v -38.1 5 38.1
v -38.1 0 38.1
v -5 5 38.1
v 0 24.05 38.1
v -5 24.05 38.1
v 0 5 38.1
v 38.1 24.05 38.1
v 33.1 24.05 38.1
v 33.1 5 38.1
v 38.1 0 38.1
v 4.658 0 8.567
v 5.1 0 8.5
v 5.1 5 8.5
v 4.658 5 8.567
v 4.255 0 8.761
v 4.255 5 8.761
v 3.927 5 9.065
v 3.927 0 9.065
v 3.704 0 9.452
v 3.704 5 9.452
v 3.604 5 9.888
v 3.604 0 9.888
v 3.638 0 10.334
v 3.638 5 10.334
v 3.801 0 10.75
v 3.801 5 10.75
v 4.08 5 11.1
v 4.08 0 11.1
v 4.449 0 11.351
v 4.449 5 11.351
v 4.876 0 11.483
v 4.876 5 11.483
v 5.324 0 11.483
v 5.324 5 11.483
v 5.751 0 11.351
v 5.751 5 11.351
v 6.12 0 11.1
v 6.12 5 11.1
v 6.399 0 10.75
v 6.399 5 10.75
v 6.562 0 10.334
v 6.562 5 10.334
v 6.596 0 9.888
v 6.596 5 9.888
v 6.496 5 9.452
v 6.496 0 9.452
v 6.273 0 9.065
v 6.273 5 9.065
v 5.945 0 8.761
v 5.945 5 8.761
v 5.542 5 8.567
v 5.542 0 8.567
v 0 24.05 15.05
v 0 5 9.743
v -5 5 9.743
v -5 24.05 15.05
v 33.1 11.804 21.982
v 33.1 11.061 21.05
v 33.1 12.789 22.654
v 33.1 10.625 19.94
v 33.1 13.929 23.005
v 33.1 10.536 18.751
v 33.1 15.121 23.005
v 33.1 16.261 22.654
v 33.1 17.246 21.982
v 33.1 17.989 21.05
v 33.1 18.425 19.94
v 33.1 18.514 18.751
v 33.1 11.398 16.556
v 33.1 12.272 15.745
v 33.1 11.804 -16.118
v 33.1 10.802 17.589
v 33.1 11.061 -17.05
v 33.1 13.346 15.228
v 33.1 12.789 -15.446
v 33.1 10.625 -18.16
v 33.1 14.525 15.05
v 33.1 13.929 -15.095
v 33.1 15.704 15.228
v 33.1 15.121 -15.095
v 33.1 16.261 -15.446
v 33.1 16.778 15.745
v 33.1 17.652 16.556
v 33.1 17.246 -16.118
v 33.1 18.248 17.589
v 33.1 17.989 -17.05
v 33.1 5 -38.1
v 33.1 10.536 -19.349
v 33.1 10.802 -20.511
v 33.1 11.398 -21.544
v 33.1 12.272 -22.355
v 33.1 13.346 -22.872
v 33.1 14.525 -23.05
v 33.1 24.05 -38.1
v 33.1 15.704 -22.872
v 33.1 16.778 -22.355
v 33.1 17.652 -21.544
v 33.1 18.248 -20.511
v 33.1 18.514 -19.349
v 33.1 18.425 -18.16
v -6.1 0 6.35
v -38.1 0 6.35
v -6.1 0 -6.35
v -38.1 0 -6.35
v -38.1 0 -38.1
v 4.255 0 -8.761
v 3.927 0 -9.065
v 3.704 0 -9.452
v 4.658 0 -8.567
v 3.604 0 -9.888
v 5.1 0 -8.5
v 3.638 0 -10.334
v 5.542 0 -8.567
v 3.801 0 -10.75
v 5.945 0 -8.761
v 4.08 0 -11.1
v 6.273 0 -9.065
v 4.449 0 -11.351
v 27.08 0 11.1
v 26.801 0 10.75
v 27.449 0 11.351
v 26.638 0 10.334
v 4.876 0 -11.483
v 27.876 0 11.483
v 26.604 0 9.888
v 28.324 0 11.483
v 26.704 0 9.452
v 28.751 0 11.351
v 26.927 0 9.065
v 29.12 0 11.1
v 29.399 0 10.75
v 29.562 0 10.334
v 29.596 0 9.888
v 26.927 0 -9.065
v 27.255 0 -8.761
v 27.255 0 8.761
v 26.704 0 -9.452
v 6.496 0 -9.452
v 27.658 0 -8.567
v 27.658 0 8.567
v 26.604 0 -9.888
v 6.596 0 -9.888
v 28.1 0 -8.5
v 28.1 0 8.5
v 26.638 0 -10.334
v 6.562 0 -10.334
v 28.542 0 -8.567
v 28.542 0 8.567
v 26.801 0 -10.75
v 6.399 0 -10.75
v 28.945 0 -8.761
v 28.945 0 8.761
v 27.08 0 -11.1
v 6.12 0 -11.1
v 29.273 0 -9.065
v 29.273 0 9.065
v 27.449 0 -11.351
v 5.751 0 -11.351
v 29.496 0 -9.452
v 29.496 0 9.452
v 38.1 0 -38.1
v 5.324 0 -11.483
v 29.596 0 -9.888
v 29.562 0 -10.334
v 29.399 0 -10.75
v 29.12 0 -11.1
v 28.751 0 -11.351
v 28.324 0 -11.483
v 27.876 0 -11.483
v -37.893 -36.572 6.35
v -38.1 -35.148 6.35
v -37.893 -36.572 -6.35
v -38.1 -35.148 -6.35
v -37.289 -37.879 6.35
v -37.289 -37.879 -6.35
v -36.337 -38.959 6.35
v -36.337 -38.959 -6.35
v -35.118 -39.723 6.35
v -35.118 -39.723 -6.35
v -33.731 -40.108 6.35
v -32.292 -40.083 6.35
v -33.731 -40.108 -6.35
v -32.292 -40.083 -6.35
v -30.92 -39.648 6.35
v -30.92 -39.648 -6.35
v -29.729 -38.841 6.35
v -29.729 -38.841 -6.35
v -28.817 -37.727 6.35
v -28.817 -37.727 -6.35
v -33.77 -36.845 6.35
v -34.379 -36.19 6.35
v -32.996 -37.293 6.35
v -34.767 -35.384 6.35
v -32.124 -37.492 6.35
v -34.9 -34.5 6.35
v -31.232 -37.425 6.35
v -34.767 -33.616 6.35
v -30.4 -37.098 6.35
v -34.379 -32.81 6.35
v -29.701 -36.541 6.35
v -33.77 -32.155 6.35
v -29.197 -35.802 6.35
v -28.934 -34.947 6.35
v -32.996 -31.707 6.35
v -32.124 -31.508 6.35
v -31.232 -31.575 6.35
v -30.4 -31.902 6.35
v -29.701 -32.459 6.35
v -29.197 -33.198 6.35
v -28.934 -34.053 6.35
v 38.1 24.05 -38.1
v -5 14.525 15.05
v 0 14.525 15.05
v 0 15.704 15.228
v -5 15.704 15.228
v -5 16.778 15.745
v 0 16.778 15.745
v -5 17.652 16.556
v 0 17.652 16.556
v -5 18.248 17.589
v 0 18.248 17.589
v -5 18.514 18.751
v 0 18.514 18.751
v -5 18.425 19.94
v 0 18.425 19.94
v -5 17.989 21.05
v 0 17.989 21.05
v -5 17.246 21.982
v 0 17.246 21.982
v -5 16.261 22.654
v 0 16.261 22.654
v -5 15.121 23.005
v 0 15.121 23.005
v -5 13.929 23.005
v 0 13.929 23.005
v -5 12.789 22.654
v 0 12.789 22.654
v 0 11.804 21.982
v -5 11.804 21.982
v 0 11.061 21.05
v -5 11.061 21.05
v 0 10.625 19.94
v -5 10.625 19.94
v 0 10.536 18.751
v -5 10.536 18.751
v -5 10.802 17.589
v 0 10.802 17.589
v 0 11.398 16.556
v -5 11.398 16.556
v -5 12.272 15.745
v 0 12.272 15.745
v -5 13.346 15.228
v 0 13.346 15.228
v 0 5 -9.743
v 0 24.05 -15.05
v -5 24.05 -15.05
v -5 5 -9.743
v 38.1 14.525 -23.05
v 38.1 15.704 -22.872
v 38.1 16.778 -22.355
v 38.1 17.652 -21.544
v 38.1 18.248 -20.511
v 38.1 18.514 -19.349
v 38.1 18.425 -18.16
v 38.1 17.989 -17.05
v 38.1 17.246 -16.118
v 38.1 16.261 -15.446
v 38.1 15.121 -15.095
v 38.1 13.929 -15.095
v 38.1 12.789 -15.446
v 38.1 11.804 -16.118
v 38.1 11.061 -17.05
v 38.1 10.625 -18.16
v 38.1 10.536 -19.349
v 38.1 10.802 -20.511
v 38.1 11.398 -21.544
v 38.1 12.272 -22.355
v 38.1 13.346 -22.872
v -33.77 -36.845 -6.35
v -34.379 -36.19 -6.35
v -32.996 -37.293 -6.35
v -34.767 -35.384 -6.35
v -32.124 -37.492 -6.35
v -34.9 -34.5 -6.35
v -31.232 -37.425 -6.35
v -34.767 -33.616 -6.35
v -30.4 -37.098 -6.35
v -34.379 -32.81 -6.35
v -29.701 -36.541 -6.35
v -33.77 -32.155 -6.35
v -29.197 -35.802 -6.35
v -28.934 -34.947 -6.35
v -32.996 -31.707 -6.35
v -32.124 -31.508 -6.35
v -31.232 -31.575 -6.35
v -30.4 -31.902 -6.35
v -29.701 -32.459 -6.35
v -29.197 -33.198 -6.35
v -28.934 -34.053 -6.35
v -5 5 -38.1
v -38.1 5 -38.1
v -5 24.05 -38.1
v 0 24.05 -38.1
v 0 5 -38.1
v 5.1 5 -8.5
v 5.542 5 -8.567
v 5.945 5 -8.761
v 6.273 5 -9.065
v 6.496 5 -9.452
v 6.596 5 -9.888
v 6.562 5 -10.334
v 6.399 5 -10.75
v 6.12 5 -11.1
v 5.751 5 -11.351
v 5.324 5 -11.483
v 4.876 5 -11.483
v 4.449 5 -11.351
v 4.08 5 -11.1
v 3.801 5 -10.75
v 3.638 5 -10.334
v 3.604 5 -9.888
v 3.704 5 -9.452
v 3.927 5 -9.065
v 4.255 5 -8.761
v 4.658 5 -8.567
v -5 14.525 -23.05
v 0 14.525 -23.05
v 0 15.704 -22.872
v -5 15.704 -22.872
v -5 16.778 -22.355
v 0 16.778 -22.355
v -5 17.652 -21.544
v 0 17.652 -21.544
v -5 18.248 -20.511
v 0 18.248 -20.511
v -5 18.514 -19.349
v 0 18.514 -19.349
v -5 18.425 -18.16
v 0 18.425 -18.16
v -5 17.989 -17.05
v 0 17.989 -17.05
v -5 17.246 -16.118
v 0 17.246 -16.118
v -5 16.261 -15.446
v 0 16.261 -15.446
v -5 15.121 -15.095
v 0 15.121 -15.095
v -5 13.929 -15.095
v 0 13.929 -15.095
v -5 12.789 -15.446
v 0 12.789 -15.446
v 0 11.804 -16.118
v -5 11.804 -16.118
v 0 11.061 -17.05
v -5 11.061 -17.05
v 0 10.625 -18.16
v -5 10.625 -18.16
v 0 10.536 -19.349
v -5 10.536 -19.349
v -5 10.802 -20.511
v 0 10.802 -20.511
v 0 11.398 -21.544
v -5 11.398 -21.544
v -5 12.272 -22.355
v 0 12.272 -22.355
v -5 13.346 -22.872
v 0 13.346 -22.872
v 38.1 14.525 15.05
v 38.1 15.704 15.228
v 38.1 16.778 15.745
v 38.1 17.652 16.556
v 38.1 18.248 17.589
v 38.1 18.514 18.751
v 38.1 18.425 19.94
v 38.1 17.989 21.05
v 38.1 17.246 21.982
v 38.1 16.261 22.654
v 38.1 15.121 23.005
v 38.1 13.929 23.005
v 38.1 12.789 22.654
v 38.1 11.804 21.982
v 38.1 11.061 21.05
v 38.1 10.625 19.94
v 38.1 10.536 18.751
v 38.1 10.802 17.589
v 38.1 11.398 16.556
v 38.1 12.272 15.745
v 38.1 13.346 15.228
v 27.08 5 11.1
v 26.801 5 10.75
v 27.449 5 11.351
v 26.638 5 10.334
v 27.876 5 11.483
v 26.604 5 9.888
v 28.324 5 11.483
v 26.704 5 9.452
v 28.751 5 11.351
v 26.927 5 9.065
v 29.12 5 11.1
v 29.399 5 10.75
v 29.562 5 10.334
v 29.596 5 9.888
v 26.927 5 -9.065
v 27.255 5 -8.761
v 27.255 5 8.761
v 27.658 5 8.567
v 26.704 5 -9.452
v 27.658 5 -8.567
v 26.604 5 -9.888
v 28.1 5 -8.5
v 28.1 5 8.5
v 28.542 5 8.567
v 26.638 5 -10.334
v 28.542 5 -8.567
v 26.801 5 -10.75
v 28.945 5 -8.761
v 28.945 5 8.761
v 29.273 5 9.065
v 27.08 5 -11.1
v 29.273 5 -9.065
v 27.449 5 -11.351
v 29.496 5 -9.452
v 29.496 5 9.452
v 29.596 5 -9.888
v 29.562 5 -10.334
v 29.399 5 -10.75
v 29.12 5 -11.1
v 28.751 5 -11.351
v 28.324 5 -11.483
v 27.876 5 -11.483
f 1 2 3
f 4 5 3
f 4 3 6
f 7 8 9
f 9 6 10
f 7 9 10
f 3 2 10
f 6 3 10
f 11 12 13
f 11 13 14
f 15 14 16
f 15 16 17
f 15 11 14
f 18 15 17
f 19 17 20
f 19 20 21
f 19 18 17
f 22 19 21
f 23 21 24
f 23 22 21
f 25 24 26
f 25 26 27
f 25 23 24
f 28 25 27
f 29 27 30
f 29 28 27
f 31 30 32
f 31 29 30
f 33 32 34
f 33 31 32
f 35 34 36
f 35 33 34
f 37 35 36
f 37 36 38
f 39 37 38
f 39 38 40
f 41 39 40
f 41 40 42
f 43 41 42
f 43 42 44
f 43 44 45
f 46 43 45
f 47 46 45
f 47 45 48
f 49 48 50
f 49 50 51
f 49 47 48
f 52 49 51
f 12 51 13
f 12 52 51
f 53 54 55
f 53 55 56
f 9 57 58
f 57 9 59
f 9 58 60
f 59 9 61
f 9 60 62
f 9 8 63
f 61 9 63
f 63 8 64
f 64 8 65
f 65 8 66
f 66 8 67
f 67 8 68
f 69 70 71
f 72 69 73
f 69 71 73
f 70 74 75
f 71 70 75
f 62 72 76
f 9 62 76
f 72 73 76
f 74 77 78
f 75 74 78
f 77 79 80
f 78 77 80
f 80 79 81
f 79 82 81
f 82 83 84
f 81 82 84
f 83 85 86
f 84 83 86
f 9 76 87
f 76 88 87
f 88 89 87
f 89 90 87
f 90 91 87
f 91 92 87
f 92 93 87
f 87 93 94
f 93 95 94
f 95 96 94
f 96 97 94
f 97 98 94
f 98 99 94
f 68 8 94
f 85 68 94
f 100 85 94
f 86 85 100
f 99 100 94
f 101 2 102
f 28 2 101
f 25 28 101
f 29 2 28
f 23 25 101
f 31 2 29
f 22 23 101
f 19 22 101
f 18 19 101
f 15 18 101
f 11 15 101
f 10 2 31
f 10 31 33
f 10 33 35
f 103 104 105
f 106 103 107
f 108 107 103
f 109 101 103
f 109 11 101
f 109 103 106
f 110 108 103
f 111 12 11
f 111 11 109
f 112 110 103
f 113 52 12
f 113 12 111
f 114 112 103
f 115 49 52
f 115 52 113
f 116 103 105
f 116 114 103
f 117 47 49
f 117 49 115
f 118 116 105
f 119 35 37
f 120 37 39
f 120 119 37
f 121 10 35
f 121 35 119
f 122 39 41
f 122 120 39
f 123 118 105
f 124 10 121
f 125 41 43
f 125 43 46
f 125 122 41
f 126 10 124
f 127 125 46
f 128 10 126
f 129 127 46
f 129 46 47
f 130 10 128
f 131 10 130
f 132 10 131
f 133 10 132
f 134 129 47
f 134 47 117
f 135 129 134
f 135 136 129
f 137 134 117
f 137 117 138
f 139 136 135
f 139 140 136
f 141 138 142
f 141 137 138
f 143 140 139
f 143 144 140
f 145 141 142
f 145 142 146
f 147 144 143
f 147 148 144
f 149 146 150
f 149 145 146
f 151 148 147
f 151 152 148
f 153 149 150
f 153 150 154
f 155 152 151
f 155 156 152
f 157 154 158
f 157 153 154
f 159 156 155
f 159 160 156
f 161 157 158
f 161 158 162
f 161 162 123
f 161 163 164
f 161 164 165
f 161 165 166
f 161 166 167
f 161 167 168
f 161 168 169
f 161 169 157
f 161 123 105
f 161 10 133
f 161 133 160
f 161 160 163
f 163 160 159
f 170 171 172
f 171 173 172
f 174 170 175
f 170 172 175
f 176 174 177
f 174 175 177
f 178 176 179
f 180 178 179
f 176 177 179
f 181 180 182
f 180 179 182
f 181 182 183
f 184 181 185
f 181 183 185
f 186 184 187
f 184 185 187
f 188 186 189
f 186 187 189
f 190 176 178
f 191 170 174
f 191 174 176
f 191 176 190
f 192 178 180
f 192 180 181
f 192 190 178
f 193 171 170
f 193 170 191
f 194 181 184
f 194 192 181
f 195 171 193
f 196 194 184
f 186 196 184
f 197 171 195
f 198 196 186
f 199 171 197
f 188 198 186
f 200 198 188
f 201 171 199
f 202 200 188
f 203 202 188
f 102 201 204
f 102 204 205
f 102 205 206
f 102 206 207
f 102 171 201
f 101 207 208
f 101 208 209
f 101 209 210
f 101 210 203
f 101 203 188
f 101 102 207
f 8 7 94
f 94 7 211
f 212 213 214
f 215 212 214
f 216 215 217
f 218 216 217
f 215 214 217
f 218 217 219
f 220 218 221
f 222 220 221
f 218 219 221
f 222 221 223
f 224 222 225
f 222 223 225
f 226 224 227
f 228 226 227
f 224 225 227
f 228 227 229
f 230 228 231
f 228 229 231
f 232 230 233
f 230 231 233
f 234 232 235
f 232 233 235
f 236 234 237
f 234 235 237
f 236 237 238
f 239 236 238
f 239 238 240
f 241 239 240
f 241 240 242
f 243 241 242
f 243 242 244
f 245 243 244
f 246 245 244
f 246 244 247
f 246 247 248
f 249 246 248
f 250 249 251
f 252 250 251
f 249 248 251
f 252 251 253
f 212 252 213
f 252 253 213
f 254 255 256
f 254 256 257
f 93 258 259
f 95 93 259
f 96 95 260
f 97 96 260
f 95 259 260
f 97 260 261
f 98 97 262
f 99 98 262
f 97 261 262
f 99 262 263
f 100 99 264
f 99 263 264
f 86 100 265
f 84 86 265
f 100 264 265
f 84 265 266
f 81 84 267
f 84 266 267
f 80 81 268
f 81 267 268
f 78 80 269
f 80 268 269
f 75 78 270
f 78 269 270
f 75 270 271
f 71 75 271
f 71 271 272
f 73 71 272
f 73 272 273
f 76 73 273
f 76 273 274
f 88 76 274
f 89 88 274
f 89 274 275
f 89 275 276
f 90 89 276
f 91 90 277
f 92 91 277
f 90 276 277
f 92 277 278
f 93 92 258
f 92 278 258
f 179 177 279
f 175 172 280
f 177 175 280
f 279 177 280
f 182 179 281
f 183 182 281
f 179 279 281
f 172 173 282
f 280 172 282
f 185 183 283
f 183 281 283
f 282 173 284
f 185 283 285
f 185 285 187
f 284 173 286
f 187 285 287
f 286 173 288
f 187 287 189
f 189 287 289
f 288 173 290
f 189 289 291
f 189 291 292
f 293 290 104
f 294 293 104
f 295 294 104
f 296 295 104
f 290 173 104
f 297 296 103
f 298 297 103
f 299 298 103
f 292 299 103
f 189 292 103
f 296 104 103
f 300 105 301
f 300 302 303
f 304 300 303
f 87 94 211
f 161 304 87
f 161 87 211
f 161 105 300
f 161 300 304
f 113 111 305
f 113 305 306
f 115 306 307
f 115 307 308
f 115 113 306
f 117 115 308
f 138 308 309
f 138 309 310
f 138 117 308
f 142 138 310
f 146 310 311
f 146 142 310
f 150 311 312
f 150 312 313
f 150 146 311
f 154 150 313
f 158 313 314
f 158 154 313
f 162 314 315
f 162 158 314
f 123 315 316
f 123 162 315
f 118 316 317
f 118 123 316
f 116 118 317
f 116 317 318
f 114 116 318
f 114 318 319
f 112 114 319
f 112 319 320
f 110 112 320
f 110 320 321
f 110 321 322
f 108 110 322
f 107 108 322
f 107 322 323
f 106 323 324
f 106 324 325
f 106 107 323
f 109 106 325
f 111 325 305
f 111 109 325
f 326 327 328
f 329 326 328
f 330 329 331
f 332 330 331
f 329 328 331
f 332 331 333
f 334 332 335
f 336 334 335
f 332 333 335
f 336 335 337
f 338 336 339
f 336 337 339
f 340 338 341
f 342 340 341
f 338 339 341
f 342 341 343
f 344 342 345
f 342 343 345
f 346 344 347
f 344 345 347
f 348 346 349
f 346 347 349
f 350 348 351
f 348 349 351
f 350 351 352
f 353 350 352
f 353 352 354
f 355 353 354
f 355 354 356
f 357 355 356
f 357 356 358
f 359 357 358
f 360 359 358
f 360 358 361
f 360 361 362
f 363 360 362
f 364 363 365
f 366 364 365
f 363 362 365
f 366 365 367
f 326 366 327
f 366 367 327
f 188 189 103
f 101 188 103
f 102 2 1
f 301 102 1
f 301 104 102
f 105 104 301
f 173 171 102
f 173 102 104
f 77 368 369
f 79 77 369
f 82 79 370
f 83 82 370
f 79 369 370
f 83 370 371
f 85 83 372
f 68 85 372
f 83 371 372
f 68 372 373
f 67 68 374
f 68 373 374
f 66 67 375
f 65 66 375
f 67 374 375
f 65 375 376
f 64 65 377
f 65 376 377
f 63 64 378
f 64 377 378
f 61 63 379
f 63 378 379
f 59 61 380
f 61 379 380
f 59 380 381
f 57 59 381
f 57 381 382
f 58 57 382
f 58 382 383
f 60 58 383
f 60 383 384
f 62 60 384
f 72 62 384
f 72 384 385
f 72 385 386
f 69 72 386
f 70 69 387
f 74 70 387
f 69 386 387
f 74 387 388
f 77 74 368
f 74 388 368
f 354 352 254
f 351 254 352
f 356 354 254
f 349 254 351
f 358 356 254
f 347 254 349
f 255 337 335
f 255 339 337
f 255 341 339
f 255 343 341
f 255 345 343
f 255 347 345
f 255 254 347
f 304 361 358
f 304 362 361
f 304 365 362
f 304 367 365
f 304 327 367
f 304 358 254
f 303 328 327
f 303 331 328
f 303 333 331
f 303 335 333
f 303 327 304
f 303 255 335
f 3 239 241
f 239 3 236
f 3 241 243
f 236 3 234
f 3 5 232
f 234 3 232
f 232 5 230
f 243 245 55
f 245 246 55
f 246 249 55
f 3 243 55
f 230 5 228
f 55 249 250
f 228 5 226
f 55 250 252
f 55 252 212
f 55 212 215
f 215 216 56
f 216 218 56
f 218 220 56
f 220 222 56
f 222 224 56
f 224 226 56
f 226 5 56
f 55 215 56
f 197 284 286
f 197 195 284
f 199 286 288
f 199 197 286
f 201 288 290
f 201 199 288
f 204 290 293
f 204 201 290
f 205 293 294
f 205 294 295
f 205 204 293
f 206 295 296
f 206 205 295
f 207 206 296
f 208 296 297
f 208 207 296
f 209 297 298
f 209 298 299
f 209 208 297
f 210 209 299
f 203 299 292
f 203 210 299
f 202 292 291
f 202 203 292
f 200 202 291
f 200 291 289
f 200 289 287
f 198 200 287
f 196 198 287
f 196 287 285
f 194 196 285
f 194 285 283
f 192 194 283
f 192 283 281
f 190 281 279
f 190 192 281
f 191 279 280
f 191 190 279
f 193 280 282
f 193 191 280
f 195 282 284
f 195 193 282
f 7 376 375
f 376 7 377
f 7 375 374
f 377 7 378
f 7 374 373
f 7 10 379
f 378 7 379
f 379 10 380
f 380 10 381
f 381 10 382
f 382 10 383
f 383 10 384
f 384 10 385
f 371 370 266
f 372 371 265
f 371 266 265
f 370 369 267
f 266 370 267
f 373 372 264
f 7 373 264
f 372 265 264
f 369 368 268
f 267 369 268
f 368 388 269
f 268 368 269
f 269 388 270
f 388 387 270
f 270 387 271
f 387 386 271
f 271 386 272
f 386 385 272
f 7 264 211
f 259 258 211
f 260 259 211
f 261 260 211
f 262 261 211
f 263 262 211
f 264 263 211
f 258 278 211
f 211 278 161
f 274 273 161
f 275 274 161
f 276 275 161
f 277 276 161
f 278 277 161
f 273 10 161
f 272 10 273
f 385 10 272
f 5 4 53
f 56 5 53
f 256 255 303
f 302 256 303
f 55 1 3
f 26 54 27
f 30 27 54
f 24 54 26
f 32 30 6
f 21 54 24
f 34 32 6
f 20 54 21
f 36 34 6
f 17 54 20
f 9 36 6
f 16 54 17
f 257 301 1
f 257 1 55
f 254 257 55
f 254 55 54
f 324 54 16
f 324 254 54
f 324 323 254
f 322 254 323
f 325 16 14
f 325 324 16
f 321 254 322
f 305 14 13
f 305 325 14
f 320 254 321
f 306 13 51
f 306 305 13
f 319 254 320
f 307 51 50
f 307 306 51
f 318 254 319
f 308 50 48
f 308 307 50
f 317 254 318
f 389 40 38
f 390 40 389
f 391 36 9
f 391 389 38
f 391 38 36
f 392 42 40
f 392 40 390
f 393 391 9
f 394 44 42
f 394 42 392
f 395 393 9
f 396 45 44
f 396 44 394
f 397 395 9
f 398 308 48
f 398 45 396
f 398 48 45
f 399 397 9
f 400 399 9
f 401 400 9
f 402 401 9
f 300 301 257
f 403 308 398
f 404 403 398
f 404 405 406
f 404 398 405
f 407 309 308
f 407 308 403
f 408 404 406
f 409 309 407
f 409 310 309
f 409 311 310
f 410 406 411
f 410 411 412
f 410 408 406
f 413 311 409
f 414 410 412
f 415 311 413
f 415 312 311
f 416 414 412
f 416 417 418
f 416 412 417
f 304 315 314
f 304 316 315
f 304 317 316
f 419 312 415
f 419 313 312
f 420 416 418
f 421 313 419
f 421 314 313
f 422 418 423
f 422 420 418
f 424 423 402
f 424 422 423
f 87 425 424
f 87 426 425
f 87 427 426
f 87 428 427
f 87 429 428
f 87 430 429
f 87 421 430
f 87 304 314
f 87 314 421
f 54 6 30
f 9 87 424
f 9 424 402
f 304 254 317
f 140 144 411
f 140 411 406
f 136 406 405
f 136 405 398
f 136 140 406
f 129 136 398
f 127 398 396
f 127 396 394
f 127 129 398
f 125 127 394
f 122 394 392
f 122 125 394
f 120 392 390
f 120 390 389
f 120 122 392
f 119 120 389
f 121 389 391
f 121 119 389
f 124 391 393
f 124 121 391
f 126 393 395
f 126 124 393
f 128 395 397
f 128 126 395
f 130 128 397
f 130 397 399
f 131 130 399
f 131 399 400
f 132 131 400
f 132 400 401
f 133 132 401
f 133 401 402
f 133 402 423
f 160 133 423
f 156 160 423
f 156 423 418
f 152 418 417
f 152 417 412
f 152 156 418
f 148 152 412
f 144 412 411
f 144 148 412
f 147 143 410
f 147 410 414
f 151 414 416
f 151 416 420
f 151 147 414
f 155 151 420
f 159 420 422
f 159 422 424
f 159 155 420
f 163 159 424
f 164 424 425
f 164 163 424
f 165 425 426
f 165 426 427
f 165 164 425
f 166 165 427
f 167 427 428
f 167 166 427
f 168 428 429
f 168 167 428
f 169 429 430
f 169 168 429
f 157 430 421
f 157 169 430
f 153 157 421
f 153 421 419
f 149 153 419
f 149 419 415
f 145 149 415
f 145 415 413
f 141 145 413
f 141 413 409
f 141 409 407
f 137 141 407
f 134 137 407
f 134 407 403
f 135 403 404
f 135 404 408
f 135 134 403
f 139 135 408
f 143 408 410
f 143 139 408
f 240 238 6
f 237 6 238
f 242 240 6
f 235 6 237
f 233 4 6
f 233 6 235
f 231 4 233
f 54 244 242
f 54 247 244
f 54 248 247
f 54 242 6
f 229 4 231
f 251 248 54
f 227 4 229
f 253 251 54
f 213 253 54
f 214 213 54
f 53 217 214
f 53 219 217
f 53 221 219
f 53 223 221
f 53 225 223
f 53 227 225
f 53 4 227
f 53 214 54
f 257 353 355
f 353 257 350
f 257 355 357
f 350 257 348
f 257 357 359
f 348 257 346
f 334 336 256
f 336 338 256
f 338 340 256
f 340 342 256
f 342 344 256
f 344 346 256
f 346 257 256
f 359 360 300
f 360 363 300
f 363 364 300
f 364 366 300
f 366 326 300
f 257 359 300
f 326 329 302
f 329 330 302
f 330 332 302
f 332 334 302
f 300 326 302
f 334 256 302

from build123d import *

# Parameters (mm, degrees)
SKETCH2_W           = 76.2
SKETCH2_H           = 76.2
SKETCH2_R           = 1.5
BOSS_EXTRUDE1_DEPTH = 5
SKETCH3_W           = 76.2
SKETCH3_H           = 24.05
SKETCH3_R           = 4
BOSS_EXTRUDE2_DEPTH = 5
LPATTERN1_COUNT     = 2
LPATTERN1_PITCH     = 38.1
BOSS_EXTRUDE5_START = -38.1
SKETCH4_R           = 3
BOSS_EXTRUDE5_DEPTH = 6.35
CUT_EXTRUDE1_DEPTH  = 10


with BuildPart() as part:
    # Sketch2 → Boss-Extrude1 (new body)
    with BuildSketch(Plane(origin=(0, 0, 0), x_dir=(1, 0, 0), z_dir=(0, 1, 0))):
        Rectangle(SKETCH2_W, SKETCH2_H)
        with Locations(Location((28.1, 10, 0), (0, 0, 270))):
            Circle(SKETCH2_R, mode=Mode.SUBTRACT)
        with Locations(Location((5.1, 10, 0), (0, 0, 270))):
            Circle(SKETCH2_R, mode=Mode.SUBTRACT)
        with Locations(Location((28.1, -10, 0), (0, 0, 90))):
            Circle(SKETCH2_R, mode=Mode.SUBTRACT)
        with Locations(Location((5.1, -10, 0), (0, 0, 90))):
            Circle(SKETCH2_R, mode=Mode.SUBTRACT)
    extrude(amount=BOSS_EXTRUDE1_DEPTH)

    # Sketch3 → Boss-Extrude2 (add)
    with BuildSketch(Plane(origin=(38.1, 0, 0), x_dir=(0, 0, -1), z_dir=(1, 0, 0))):
        with Locations((0, 12.025)):
            Rectangle(SKETCH3_W, SKETCH3_H)
        with Locations((-19.05, 14.525)):
            Circle(SKETCH3_R, mode=Mode.SUBTRACT)
        with Locations((19.05, 14.525)):
            Circle(SKETCH3_R, mode=Mode.SUBTRACT)
    boss_extrude2 = extrude(amount=-BOSS_EXTRUDE2_DEPTH)

    # LPattern1: Boss-Extrude2 ×2
    with Locations(*[(-i * LPATTERN1_PITCH, 0, 0) for i in range(1, LPATTERN1_COUNT)]):
        add(boss_extrude2)

    # Sketch4 → Boss-Extrude5 (add, symmetric)
    with BuildSketch(Plane(origin=(0, 0, -38.1), x_dir=(-1, 0, 0), z_dir=(0, 0, -1)).offset(BOSS_EXTRUDE5_START)):
        with BuildLine():
            Line((6.1, 0), (38.1, 0))
            Line((38.1, 0), (38.1, -35.148267781))
            ThreePointArc((38.1, -35.148267781), (34.438424912, -39.965800215), (28.816552498, -37.72742995))
            Line((28.816552498, -37.72742995), (6.1, 0))
        make_face()
        with Locations((31.9, -34.5)):
            Circle(SKETCH4_R, mode=Mode.SUBTRACT)
    extrude(amount=BOSS_EXTRUDE5_DEPTH, both=True)

    # Sketch5 → Cut-Extrude1 (cut)
    with BuildSketch(Plane(origin=(0, 0, 0), x_dir=(0, 0, -1), z_dir=(1, 0, 0))):
        Polygon((9.743329583, 5), (-9.743329583, 5), (-15.05, 24.05), (-9.743329583, 24.05), (9.743329583, 24.05), (15.05, 24.05), align=None)
    extrude(amount=-CUT_EXTRUDE1_DEPTH, mode=Mode.SUBTRACT)


solid = part.part
